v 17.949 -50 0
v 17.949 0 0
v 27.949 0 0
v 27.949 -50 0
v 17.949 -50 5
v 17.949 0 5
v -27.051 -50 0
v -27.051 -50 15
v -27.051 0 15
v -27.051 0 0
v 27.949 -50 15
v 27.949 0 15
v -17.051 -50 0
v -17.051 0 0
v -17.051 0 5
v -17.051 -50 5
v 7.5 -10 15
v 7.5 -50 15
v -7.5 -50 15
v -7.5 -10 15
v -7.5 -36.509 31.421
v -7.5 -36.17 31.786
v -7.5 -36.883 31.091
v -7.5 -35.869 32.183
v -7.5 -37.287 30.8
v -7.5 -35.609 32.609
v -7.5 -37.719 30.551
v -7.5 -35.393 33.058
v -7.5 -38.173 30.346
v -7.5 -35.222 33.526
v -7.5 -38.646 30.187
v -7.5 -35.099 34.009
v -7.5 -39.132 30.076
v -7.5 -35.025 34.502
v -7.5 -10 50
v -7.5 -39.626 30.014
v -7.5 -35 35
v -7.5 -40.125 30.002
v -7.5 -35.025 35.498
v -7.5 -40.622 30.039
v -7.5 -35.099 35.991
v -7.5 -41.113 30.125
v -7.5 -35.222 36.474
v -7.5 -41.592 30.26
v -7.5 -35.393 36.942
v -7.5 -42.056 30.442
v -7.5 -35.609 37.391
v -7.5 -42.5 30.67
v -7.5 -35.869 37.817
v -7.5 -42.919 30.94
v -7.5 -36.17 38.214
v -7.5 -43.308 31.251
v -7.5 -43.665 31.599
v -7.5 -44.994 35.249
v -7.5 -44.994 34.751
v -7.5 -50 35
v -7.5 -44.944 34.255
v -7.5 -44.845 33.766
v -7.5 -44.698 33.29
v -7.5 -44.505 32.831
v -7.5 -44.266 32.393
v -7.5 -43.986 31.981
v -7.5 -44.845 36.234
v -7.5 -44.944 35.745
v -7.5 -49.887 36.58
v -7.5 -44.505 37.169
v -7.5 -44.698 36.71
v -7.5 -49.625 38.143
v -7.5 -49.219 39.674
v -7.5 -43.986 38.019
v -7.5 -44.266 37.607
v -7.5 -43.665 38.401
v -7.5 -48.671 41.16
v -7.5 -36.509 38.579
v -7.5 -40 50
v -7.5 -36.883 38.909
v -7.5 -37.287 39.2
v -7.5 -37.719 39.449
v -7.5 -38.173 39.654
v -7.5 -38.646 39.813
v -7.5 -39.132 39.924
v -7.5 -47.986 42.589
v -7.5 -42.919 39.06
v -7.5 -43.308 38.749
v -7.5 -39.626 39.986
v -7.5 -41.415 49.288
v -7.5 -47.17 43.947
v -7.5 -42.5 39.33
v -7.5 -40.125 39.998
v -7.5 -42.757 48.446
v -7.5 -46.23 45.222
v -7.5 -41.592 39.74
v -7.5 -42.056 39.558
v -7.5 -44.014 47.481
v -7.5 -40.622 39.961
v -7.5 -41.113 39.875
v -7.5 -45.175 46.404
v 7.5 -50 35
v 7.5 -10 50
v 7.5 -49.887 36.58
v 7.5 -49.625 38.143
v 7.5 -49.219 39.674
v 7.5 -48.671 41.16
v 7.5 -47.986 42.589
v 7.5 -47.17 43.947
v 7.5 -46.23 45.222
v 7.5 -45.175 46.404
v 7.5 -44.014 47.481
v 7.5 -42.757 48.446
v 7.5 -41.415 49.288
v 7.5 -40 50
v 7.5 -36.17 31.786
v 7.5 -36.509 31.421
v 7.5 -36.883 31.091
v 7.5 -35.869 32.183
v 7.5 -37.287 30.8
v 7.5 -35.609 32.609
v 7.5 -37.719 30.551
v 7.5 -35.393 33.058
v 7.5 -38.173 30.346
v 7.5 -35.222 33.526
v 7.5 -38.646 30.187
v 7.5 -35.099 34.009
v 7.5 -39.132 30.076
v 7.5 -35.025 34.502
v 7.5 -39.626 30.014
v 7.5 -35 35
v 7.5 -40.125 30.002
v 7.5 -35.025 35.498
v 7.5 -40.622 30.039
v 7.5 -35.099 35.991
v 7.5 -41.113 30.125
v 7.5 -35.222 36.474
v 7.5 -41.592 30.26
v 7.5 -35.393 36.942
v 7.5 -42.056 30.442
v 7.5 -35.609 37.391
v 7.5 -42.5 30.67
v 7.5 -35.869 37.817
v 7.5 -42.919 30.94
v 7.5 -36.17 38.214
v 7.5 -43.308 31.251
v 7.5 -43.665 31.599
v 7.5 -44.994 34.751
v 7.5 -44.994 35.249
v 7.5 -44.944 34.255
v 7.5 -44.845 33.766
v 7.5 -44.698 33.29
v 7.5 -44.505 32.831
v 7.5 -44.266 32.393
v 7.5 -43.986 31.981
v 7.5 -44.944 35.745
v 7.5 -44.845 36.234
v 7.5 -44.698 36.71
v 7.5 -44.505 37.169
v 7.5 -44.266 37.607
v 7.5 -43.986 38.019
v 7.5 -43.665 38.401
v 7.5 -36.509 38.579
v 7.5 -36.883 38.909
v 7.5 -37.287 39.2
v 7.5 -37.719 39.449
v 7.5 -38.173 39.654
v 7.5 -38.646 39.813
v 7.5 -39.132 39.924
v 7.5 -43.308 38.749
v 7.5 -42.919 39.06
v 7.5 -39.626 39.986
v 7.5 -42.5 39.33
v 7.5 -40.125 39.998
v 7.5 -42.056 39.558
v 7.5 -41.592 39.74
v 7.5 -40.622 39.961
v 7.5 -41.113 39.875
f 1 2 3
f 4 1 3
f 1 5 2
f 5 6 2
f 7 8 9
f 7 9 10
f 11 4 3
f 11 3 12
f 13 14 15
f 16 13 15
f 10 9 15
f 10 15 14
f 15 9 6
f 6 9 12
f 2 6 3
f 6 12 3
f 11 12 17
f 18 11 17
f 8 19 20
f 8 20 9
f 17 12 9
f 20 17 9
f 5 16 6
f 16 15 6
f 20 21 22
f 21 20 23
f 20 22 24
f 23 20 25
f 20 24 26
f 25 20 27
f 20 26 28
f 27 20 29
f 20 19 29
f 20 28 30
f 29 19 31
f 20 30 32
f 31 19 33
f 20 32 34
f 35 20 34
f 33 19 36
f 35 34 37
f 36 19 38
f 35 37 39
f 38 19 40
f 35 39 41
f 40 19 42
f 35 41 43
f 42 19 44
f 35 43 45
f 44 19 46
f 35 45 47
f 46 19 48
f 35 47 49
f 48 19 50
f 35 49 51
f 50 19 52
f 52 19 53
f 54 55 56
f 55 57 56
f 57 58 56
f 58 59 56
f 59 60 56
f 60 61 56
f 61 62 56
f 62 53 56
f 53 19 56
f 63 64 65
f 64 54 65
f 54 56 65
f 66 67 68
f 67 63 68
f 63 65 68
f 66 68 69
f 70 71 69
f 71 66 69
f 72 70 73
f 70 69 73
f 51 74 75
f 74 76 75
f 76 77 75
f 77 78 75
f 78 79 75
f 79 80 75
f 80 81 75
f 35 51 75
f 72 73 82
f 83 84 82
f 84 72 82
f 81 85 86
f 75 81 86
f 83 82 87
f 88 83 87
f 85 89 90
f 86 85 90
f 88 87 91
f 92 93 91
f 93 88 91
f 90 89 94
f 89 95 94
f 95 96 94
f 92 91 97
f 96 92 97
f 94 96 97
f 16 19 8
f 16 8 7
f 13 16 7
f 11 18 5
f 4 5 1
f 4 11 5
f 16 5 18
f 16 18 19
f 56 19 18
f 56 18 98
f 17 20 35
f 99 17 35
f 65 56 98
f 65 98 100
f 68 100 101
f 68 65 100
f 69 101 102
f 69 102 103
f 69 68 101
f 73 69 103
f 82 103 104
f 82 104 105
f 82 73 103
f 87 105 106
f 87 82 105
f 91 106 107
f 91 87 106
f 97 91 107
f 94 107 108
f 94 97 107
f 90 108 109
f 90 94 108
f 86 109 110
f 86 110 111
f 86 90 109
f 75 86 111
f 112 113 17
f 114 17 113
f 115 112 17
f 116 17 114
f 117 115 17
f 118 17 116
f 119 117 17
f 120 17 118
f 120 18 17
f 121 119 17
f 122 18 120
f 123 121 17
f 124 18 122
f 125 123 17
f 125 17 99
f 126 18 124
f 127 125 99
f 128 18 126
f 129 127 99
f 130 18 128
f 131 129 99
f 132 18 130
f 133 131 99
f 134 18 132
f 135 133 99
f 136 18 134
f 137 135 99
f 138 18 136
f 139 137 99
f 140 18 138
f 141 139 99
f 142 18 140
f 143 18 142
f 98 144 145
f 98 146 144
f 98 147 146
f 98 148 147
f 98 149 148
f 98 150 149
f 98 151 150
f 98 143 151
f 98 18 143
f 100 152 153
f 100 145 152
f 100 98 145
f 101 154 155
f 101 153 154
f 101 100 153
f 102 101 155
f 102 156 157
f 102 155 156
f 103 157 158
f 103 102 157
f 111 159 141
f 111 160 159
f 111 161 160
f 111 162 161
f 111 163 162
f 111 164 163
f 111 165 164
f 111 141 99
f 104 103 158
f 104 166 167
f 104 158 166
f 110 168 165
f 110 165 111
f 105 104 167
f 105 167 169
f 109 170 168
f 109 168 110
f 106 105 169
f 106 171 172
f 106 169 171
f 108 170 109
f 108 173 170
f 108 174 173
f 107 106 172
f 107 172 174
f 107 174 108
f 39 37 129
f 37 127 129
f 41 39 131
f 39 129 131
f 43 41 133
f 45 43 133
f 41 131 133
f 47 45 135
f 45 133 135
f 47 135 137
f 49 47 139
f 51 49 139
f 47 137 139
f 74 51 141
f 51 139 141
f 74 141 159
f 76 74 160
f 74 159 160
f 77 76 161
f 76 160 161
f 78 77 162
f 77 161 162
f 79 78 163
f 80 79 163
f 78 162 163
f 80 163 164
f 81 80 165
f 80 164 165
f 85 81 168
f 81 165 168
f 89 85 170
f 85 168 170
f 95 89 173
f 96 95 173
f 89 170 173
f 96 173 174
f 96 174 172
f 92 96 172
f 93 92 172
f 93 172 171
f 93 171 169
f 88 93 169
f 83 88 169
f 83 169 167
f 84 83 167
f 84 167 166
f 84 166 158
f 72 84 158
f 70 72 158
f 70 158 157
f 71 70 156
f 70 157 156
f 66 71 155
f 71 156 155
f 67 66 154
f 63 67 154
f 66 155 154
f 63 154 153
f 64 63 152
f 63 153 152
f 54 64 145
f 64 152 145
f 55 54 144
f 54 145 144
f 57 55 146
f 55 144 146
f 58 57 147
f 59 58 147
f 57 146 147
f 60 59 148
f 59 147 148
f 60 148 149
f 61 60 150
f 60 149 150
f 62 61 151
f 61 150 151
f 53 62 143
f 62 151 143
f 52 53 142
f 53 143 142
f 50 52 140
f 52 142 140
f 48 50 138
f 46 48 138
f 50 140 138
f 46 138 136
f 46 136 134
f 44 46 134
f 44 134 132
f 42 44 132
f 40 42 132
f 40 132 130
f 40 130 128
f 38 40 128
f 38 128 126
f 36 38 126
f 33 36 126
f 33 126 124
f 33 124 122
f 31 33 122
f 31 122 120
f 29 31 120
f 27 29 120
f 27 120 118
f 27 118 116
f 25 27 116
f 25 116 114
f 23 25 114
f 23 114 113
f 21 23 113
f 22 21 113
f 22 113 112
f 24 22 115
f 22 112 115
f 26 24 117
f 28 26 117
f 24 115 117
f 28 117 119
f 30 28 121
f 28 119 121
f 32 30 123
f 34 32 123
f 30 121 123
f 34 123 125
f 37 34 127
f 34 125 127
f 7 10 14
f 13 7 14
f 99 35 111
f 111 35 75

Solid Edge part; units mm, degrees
sketch "Sketch1" plane through (0, 0, 0) normal (0, -1, 0) x (1, 0, 0)
  line L0 (-17.0509, 0) -> (-17.0509, 5)
  line L1 (-17.0509, 5) -> (17.9491, 5)
  line L2 (17.9491, 5) -> (17.9491, 0)
  line L3 (17.9491, 0) -> (27.9491, 0)
  line L4 (27.9491, 0) -> (27.9491, 15)
  line L5 (27.9491, 15) -> (-27.0509, 15)
  line L6 (-27.0509, 15) -> (-27.0509, 0)
  line L7 (-27.0509, 0) -> (-17.0509, 0)
extrude "Protrusion1" add sketch "Sketch1" along normal blind 50
extrude "ExtrudedCutout_3" [suppressed]
sketch "Sketch2" plane through (0, 0, 0) normal (1, 0, 0) x (0, 1, 0)
  line L0 (-50, 15) -> (-10, 15)
  line L1 (-10, 15) -> (-10, 50)
  line L2 (-10, 50) -> (-40, 50)
  arc A0 (-50, 35) -> (-40, 50) centre (-33.1234, 34.5823) cw
  line L3 (-50, 15) -> (-50, 35)
extrude "ExtrudedProtrusion_6" add sketch "Sketch2" along normal mid plane 15
sketch "Sketch3" plane through (7.5, -30, 32.5) normal (1, 0, 0) x (0, 1, 0)
  circle A0 centre (-10, 2.5) radius 5
extrude "ExtrudedCutout_4" cut sketch "Sketch3" against normal blind 55.8479
